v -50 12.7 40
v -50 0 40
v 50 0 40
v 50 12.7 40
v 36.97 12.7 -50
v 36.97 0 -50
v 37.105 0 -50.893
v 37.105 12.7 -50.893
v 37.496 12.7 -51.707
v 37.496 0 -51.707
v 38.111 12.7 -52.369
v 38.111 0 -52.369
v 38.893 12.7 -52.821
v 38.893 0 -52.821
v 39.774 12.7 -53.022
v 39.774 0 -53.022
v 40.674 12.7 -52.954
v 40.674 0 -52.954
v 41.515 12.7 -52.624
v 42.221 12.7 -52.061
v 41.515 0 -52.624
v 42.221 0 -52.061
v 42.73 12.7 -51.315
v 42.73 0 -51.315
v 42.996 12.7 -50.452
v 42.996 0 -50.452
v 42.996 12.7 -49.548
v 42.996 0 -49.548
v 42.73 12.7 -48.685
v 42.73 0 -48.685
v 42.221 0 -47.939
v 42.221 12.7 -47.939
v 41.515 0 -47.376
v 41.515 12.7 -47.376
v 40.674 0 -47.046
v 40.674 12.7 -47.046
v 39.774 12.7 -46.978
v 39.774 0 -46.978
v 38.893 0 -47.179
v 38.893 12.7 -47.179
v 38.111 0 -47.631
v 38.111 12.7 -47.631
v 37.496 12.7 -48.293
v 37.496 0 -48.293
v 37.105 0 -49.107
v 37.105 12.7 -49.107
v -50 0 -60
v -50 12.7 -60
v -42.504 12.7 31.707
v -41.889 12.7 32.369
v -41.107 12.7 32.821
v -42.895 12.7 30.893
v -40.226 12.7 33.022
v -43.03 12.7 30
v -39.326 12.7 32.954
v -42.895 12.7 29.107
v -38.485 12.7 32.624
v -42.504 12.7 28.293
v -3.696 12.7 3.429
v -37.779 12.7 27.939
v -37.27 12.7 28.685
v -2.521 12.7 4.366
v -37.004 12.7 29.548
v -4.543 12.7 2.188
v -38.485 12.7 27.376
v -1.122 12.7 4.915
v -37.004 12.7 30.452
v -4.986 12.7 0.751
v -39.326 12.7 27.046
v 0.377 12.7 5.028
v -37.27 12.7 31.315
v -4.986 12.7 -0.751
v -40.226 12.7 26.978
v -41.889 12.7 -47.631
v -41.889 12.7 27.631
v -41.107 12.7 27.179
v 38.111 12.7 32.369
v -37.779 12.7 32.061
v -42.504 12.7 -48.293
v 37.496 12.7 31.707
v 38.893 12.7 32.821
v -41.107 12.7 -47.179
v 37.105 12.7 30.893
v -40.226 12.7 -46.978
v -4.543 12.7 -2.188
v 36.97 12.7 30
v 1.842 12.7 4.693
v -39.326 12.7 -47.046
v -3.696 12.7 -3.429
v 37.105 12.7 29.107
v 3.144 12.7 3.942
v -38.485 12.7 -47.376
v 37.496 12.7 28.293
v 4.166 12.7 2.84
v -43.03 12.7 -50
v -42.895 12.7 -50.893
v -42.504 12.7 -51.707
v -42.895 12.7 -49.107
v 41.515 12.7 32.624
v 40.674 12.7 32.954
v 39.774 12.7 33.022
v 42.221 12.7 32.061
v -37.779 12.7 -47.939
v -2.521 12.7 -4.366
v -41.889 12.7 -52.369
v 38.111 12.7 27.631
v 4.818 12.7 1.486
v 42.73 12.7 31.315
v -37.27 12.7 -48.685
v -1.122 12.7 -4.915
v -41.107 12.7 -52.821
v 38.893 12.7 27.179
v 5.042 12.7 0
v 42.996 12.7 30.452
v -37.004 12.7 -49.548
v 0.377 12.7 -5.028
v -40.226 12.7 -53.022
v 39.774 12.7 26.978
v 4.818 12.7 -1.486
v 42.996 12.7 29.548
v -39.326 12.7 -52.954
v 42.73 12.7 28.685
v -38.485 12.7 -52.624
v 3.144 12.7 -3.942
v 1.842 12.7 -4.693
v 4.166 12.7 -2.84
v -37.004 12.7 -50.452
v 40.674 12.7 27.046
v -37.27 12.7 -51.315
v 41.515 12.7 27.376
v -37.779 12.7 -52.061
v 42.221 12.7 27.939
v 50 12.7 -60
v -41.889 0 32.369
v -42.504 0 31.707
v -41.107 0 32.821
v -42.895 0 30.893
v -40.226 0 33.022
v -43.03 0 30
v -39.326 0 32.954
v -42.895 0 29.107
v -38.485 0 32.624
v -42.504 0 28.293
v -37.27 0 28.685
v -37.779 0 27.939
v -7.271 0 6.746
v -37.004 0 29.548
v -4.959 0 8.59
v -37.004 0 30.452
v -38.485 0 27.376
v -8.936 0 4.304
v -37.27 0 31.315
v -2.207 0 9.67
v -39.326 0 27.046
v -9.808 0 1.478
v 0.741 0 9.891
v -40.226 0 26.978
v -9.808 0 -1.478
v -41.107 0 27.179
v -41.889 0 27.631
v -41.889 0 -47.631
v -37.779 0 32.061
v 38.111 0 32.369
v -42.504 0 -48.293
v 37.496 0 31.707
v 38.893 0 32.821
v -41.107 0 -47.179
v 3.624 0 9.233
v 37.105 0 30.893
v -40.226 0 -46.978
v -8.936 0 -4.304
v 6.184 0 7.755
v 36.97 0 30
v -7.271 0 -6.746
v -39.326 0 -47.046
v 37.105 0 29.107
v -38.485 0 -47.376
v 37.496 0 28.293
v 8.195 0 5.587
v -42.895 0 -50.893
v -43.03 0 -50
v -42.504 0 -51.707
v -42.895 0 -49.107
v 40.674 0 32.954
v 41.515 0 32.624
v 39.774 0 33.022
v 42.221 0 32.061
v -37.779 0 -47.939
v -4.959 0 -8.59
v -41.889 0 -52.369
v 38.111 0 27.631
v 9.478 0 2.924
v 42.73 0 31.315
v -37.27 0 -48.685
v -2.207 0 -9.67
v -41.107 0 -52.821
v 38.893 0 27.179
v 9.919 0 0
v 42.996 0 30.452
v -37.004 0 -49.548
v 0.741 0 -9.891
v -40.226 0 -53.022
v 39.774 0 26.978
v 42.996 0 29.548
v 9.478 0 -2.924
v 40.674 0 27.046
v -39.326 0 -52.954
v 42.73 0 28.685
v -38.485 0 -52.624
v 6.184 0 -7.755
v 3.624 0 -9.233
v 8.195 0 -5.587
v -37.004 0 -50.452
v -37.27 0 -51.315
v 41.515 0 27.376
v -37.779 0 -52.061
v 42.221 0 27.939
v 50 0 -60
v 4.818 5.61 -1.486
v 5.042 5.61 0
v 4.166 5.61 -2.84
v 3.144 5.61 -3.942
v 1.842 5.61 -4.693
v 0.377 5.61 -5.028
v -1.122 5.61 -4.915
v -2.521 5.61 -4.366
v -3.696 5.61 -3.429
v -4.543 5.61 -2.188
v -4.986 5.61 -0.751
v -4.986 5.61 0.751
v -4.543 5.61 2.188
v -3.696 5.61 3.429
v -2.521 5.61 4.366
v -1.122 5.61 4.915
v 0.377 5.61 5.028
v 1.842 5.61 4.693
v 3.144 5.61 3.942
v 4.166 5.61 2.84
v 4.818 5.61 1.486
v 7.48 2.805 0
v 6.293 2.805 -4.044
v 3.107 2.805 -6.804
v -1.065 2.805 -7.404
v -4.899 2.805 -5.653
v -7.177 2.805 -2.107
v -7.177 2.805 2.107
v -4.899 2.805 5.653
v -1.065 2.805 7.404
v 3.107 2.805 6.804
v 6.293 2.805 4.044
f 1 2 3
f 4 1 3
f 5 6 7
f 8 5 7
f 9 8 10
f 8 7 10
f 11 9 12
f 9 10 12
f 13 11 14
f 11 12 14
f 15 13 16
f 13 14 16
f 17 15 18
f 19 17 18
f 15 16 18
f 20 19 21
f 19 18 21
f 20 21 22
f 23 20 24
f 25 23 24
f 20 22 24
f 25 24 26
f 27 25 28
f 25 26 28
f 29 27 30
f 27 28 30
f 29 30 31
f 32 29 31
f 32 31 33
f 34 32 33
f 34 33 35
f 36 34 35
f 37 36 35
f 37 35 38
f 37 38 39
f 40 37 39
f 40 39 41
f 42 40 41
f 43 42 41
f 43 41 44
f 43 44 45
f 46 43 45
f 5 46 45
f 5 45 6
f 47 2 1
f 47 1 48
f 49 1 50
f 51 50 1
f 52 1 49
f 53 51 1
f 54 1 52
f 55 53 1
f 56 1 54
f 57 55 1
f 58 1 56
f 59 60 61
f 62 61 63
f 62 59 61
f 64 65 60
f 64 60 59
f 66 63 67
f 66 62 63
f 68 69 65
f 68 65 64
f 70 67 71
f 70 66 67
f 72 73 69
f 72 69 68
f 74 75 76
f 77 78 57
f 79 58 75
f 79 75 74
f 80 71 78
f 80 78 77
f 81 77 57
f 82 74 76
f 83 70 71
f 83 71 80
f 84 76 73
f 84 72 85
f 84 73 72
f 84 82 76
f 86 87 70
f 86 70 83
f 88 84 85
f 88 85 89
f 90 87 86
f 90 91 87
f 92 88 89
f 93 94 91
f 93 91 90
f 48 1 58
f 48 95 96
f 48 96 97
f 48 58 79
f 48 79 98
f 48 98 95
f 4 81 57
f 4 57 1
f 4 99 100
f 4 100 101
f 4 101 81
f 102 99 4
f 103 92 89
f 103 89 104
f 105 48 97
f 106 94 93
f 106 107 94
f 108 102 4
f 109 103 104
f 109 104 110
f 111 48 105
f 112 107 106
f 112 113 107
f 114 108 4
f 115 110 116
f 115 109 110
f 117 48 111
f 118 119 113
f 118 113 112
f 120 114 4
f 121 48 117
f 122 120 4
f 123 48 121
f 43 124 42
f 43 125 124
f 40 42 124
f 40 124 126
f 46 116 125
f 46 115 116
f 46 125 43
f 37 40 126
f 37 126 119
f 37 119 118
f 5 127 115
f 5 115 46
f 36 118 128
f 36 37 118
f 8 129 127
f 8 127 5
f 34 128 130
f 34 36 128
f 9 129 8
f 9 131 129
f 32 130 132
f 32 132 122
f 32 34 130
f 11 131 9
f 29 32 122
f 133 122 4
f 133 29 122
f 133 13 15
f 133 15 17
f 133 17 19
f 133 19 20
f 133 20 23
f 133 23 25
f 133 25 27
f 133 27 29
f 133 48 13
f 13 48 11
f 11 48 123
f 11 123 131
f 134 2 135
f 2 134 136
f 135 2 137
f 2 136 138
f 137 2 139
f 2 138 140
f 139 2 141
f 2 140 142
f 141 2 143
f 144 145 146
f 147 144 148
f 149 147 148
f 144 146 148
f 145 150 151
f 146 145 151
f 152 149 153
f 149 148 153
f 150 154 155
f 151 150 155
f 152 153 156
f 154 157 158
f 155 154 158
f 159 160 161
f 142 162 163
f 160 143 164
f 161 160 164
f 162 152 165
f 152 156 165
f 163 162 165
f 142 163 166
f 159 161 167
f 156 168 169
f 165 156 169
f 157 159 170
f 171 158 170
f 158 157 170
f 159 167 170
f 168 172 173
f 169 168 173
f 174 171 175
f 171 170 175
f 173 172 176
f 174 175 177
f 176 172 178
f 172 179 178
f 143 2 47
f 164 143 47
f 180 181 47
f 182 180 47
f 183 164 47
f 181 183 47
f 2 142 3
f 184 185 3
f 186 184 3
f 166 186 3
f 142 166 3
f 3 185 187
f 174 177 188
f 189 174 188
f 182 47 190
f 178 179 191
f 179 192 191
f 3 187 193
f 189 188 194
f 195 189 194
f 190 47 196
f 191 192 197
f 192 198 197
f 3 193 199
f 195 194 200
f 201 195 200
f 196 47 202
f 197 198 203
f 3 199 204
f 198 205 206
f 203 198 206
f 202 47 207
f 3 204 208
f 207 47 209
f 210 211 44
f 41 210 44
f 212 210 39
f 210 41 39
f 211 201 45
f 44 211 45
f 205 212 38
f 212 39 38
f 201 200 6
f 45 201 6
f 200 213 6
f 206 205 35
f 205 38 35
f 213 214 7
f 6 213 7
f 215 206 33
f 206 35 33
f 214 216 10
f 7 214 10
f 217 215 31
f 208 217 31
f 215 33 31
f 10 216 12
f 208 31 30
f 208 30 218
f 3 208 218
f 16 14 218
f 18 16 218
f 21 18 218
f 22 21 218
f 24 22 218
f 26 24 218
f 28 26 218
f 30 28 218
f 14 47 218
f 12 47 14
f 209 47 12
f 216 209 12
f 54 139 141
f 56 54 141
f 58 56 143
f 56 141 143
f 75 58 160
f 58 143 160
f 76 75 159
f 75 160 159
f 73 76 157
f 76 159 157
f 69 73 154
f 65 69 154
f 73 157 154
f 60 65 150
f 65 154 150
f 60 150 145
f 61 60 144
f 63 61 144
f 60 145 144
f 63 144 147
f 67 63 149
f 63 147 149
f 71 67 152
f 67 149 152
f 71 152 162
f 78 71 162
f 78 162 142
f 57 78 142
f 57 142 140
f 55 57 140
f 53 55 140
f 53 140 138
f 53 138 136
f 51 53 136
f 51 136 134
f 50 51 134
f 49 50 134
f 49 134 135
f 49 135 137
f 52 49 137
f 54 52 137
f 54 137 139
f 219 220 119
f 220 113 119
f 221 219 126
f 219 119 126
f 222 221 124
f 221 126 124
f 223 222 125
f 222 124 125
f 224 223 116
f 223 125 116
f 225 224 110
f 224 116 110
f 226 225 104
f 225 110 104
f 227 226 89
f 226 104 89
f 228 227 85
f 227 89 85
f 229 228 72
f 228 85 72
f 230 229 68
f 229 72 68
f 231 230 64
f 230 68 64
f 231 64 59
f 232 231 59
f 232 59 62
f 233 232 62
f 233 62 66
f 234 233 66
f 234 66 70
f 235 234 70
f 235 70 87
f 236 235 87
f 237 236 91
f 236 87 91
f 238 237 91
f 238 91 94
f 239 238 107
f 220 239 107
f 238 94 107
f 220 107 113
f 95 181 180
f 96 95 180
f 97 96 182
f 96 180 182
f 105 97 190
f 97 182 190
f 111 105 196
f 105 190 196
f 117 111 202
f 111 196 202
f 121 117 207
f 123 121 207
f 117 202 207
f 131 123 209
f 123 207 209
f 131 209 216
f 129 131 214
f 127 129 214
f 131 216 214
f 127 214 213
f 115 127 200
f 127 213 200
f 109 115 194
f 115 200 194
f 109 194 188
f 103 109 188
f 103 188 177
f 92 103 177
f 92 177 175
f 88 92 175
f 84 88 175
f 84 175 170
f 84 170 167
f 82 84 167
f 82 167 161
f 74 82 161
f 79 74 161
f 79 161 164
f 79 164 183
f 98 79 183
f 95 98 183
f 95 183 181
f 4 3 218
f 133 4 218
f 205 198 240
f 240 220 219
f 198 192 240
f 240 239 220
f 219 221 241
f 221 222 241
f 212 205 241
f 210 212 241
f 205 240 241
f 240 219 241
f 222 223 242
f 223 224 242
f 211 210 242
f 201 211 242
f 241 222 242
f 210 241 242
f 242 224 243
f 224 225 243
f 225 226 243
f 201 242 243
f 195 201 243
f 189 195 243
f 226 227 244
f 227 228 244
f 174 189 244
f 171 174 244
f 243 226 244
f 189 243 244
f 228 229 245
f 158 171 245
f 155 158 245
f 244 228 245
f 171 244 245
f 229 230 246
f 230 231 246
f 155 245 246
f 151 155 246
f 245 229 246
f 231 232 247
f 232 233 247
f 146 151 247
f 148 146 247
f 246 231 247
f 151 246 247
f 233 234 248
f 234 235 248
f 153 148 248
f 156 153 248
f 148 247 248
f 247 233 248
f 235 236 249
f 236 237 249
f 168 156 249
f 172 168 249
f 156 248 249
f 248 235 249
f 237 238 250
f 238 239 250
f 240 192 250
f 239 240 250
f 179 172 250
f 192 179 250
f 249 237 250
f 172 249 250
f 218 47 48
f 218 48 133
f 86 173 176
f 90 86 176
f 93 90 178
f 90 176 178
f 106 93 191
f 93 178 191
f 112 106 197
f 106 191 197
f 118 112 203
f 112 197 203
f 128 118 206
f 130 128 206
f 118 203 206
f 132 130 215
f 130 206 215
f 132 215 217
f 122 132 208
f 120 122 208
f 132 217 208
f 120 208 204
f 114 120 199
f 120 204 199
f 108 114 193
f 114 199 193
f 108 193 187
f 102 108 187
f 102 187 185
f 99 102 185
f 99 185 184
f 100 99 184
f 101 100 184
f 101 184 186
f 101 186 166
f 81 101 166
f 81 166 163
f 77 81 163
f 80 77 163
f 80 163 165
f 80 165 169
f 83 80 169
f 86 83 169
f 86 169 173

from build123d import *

# Parameters (mm, degrees)
SKETCH1_W                                           = 100
SKETCH1_H                                           = 100
BOSS_EXTRUDE1_DEPTH                                 = 12.7
M5_CLEARANCE_HOLE1_D                                = 6.06
CSK_FOR_3_8_FLAT_HEAD_SOCKET_CAP_SCREW1_D           = 10.0838
CSK_FOR_3_8_FLAT_HEAD_SOCKET_CAP_SCREW1_CSINK_D     = 19.8374
CSK_FOR_3_8_FLAT_HEAD_SOCKET_CAP_SCREW1_CSINK_ANGLE = 82


with BuildPart() as part:
    # Sketch1 → Boss-Extrude1 (new body)
    with BuildSketch(Plane(origin=(0, 0, 0), x_dir=(1, 0, 0), z_dir=(0, 1, 0))):
        with Locations((0, 10)):
            Rectangle(SKETCH1_W, SKETCH1_H)
    extrude(amount=BOSS_EXTRUDE1_DEPTH)

    # M5 Clearance Hole1 (through all)
    with Locations(Plane(origin=(0, 12.7, 0), x_dir=(1, 0, 0), z_dir=(0, 1, 0))):
        with Locations((-40, 50), (40, 50), (40, -30), (-40, -30)):
            Hole(M5_CLEARANCE_HOLE1_D / 2)

    # CSK for 3/8 Flat Head Socket Cap Screw1 (through all)
    with Locations(Plane(origin=(0, 0, 0), x_dir=(-1, 0, 0), z_dir=(0, -1, 0))):
        with Locations((0, 0)):
            CounterSinkHole(CSK_FOR_3_8_FLAT_HEAD_SOCKET_CAP_SCREW1_D / 2, CSK_FOR_3_8_FLAT_HEAD_SOCKET_CAP_SCREW1_CSINK_D / 2, counter_sink_angle=CSK_FOR_3_8_FLAT_HEAD_SOCKET_CAP_SCREW1_CSINK_ANGLE)


solid = part.part
